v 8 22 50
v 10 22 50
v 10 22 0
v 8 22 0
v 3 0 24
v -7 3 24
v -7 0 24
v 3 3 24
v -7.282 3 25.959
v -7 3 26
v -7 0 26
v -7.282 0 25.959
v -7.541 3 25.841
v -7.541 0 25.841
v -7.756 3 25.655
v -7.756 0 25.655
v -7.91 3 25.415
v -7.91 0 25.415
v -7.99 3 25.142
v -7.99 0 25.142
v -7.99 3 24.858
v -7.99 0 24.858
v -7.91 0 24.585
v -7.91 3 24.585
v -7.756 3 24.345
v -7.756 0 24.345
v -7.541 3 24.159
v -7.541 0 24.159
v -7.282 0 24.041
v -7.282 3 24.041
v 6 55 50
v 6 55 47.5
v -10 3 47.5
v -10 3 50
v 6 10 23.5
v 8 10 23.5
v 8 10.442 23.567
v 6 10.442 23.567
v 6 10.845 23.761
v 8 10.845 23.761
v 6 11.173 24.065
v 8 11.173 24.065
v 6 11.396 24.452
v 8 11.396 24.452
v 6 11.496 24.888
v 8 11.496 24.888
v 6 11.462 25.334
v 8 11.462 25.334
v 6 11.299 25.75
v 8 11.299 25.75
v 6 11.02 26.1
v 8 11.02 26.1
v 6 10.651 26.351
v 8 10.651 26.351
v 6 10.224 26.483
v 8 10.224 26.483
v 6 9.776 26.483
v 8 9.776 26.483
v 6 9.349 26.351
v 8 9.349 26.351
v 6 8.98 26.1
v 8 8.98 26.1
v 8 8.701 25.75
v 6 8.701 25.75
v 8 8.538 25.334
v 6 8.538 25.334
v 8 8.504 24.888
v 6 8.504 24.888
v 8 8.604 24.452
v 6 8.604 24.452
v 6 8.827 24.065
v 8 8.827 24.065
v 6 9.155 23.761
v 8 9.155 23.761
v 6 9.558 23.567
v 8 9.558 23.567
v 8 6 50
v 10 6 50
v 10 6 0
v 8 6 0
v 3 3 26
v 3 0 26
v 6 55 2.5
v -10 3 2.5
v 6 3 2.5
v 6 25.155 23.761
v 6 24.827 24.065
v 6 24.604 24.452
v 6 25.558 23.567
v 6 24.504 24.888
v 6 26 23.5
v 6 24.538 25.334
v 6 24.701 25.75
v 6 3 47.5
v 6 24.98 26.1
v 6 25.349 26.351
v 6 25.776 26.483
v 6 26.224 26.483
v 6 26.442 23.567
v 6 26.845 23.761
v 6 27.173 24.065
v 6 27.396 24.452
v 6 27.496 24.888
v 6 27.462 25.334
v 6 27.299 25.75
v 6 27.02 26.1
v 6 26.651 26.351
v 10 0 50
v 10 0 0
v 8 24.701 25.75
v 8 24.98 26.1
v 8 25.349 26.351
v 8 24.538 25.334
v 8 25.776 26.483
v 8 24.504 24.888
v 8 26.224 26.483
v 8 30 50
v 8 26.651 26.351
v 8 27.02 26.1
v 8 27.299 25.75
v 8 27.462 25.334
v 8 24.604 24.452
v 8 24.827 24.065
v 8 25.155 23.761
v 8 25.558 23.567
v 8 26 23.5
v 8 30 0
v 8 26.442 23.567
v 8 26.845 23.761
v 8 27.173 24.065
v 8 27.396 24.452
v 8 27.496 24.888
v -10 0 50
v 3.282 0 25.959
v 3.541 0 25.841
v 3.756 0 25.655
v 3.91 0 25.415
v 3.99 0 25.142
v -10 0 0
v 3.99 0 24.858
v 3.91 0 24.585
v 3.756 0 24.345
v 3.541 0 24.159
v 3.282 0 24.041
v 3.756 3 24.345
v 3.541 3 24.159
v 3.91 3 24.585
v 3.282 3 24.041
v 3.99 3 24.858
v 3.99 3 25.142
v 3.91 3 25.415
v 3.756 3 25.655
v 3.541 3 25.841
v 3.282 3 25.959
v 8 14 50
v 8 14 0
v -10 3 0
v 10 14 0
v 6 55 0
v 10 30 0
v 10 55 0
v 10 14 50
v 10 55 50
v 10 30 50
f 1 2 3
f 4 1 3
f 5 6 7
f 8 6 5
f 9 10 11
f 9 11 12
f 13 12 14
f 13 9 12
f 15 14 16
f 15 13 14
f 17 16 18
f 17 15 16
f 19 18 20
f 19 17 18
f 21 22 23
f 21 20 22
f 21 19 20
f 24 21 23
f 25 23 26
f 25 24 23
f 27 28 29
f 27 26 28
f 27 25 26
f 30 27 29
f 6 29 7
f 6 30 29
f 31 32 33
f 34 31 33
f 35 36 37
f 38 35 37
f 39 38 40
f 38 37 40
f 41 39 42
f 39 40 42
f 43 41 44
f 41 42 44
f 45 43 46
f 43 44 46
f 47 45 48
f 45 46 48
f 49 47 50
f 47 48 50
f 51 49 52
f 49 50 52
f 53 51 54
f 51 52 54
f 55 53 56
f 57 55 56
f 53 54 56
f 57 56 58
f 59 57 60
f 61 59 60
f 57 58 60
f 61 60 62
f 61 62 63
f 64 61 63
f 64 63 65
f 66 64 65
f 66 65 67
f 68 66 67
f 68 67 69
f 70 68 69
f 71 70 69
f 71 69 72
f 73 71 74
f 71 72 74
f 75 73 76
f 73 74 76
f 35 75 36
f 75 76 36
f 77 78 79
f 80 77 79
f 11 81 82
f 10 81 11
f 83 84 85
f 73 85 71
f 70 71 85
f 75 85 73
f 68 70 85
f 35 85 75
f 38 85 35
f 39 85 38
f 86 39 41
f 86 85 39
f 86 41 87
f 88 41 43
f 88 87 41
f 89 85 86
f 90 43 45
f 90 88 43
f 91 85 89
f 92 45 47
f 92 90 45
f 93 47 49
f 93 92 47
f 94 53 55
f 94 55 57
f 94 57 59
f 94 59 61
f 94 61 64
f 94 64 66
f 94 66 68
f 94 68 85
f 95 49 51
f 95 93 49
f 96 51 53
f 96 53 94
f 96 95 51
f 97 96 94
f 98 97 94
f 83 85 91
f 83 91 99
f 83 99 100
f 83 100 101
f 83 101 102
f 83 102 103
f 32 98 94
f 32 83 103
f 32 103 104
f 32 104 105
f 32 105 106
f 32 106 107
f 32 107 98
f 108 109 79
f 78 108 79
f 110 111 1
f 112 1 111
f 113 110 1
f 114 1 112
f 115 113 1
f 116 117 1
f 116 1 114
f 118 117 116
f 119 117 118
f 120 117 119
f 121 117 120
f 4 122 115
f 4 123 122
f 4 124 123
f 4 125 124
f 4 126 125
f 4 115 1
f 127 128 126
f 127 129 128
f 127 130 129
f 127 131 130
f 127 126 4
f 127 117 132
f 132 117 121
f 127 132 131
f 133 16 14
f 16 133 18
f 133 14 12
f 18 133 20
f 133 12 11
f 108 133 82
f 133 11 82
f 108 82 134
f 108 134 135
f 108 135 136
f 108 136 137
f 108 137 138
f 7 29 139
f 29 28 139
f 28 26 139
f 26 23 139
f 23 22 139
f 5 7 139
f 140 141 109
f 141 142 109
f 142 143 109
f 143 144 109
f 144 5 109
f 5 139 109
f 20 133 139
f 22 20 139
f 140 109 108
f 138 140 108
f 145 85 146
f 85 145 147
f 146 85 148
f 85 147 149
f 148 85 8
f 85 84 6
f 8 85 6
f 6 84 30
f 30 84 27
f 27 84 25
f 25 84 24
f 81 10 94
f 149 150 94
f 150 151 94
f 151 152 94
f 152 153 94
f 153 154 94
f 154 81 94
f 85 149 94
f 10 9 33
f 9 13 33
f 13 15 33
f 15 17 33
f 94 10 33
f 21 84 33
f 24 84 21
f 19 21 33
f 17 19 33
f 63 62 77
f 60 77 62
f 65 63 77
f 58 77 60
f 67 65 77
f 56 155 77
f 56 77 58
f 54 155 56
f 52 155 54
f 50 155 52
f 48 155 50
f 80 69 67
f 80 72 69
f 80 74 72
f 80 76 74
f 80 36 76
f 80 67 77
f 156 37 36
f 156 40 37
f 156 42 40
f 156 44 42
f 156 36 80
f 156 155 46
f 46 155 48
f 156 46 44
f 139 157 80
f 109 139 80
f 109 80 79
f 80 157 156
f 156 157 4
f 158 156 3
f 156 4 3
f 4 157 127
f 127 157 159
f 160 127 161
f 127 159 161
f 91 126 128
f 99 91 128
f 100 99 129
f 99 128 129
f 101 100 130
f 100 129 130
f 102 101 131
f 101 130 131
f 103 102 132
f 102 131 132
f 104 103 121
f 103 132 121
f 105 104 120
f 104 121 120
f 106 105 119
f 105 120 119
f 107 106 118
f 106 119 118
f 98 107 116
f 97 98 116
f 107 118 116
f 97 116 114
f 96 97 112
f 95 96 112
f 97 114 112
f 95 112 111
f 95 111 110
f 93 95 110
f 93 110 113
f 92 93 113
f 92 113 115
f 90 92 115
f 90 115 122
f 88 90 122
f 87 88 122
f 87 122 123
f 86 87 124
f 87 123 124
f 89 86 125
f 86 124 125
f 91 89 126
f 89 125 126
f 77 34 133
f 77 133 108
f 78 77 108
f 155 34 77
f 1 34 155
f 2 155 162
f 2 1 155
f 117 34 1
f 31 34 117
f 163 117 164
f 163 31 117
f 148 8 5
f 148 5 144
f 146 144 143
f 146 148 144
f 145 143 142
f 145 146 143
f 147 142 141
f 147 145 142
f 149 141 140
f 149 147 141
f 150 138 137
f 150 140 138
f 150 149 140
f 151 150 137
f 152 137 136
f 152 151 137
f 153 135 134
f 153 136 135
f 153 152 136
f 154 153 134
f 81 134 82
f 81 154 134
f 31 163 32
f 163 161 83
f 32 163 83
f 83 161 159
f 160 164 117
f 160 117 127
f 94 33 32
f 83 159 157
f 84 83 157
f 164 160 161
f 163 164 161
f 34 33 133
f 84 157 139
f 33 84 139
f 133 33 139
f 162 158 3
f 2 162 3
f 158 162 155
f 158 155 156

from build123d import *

# Parameters (mm, degrees)
BOSS_EXTRUDE1_DEPTH = 50
SKETCH2_W           = 50
SKETCH2_H           = 8
CUT_EXTRUDE1_DEPTH  = 2
SKETCH4_W           = 45
SKETCH4_H           = 52
CUT_EXTRUDE2_DEPTH  = 16
SKETCH6_R           = 1.5
CUT_EXTRUDE4_DEPTH  = 2
CUT_EXTRUDE_2_DEPTH = 16


with BuildPart() as part:
    # Sketch1 → Boss-Extrude1 (new body)
    with BuildSketch(Plane.XY):
        Polygon((-10, 0), (10, 0), (10, 55), (6, 55), (-10, 3), align=None)
    extrude(amount=BOSS_EXTRUDE1_DEPTH)

    # Sketch2 → Cut-Extrude1 (cut)
    with BuildSketch(Plane(origin=(10, 0, 0), x_dir=(0, 0, -1), z_dir=(1, 0, 0))):
        with Locations((-25, 10)):
            Rectangle(SKETCH2_W, SKETCH2_H)
        with Locations((-25, 26)):
            Rectangle(SKETCH2_W, SKETCH2_H)
    extrude(amount=-CUT_EXTRUDE1_DEPTH, mode=Mode.SUBTRACT)

    # Sketch4 → Cut-Extrude2 (cut)
    with BuildSketch(Plane.ZY.offset(10)):
        with Locations((25, 29)):
            Rectangle(SKETCH4_W, SKETCH4_H)
    extrude(amount=-CUT_EXTRUDE2_DEPTH, mode=Mode.SUBTRACT)

    # Sketch6 → Cut-Extrude4 (cut)
    with BuildSketch(Plane(origin=(8, 0, 0), x_dir=(0, 0, -1), z_dir=(1, 0, 0))):
        with Locations((-25, 26)):
            Circle(SKETCH6_R)
        with Locations((-25, 10)):
            Circle(SKETCH6_R)
    extrude(amount=-CUT_EXTRUDE4_DEPTH, mode=Mode.SUBTRACT)

    # 草图2 → 切除-拉伸2 (cut)
    with BuildSketch(Plane(origin=(0, 3, 0), x_dir=(1, 0, 0), z_dir=(0, 1, 0))):
        with BuildLine():
            Line((-7, -24), (3, -24))
            ThreePointArc((3, -24), (4, -25), (3, -26))
            Line((3, -26), (-7, -26))
            ThreePointArc((-7, -26), (-8, -25), (-7, -24))
        make_face()
    extrude(amount=-CUT_EXTRUDE_2_DEPTH, mode=Mode.SUBTRACT)


solid = part.part
